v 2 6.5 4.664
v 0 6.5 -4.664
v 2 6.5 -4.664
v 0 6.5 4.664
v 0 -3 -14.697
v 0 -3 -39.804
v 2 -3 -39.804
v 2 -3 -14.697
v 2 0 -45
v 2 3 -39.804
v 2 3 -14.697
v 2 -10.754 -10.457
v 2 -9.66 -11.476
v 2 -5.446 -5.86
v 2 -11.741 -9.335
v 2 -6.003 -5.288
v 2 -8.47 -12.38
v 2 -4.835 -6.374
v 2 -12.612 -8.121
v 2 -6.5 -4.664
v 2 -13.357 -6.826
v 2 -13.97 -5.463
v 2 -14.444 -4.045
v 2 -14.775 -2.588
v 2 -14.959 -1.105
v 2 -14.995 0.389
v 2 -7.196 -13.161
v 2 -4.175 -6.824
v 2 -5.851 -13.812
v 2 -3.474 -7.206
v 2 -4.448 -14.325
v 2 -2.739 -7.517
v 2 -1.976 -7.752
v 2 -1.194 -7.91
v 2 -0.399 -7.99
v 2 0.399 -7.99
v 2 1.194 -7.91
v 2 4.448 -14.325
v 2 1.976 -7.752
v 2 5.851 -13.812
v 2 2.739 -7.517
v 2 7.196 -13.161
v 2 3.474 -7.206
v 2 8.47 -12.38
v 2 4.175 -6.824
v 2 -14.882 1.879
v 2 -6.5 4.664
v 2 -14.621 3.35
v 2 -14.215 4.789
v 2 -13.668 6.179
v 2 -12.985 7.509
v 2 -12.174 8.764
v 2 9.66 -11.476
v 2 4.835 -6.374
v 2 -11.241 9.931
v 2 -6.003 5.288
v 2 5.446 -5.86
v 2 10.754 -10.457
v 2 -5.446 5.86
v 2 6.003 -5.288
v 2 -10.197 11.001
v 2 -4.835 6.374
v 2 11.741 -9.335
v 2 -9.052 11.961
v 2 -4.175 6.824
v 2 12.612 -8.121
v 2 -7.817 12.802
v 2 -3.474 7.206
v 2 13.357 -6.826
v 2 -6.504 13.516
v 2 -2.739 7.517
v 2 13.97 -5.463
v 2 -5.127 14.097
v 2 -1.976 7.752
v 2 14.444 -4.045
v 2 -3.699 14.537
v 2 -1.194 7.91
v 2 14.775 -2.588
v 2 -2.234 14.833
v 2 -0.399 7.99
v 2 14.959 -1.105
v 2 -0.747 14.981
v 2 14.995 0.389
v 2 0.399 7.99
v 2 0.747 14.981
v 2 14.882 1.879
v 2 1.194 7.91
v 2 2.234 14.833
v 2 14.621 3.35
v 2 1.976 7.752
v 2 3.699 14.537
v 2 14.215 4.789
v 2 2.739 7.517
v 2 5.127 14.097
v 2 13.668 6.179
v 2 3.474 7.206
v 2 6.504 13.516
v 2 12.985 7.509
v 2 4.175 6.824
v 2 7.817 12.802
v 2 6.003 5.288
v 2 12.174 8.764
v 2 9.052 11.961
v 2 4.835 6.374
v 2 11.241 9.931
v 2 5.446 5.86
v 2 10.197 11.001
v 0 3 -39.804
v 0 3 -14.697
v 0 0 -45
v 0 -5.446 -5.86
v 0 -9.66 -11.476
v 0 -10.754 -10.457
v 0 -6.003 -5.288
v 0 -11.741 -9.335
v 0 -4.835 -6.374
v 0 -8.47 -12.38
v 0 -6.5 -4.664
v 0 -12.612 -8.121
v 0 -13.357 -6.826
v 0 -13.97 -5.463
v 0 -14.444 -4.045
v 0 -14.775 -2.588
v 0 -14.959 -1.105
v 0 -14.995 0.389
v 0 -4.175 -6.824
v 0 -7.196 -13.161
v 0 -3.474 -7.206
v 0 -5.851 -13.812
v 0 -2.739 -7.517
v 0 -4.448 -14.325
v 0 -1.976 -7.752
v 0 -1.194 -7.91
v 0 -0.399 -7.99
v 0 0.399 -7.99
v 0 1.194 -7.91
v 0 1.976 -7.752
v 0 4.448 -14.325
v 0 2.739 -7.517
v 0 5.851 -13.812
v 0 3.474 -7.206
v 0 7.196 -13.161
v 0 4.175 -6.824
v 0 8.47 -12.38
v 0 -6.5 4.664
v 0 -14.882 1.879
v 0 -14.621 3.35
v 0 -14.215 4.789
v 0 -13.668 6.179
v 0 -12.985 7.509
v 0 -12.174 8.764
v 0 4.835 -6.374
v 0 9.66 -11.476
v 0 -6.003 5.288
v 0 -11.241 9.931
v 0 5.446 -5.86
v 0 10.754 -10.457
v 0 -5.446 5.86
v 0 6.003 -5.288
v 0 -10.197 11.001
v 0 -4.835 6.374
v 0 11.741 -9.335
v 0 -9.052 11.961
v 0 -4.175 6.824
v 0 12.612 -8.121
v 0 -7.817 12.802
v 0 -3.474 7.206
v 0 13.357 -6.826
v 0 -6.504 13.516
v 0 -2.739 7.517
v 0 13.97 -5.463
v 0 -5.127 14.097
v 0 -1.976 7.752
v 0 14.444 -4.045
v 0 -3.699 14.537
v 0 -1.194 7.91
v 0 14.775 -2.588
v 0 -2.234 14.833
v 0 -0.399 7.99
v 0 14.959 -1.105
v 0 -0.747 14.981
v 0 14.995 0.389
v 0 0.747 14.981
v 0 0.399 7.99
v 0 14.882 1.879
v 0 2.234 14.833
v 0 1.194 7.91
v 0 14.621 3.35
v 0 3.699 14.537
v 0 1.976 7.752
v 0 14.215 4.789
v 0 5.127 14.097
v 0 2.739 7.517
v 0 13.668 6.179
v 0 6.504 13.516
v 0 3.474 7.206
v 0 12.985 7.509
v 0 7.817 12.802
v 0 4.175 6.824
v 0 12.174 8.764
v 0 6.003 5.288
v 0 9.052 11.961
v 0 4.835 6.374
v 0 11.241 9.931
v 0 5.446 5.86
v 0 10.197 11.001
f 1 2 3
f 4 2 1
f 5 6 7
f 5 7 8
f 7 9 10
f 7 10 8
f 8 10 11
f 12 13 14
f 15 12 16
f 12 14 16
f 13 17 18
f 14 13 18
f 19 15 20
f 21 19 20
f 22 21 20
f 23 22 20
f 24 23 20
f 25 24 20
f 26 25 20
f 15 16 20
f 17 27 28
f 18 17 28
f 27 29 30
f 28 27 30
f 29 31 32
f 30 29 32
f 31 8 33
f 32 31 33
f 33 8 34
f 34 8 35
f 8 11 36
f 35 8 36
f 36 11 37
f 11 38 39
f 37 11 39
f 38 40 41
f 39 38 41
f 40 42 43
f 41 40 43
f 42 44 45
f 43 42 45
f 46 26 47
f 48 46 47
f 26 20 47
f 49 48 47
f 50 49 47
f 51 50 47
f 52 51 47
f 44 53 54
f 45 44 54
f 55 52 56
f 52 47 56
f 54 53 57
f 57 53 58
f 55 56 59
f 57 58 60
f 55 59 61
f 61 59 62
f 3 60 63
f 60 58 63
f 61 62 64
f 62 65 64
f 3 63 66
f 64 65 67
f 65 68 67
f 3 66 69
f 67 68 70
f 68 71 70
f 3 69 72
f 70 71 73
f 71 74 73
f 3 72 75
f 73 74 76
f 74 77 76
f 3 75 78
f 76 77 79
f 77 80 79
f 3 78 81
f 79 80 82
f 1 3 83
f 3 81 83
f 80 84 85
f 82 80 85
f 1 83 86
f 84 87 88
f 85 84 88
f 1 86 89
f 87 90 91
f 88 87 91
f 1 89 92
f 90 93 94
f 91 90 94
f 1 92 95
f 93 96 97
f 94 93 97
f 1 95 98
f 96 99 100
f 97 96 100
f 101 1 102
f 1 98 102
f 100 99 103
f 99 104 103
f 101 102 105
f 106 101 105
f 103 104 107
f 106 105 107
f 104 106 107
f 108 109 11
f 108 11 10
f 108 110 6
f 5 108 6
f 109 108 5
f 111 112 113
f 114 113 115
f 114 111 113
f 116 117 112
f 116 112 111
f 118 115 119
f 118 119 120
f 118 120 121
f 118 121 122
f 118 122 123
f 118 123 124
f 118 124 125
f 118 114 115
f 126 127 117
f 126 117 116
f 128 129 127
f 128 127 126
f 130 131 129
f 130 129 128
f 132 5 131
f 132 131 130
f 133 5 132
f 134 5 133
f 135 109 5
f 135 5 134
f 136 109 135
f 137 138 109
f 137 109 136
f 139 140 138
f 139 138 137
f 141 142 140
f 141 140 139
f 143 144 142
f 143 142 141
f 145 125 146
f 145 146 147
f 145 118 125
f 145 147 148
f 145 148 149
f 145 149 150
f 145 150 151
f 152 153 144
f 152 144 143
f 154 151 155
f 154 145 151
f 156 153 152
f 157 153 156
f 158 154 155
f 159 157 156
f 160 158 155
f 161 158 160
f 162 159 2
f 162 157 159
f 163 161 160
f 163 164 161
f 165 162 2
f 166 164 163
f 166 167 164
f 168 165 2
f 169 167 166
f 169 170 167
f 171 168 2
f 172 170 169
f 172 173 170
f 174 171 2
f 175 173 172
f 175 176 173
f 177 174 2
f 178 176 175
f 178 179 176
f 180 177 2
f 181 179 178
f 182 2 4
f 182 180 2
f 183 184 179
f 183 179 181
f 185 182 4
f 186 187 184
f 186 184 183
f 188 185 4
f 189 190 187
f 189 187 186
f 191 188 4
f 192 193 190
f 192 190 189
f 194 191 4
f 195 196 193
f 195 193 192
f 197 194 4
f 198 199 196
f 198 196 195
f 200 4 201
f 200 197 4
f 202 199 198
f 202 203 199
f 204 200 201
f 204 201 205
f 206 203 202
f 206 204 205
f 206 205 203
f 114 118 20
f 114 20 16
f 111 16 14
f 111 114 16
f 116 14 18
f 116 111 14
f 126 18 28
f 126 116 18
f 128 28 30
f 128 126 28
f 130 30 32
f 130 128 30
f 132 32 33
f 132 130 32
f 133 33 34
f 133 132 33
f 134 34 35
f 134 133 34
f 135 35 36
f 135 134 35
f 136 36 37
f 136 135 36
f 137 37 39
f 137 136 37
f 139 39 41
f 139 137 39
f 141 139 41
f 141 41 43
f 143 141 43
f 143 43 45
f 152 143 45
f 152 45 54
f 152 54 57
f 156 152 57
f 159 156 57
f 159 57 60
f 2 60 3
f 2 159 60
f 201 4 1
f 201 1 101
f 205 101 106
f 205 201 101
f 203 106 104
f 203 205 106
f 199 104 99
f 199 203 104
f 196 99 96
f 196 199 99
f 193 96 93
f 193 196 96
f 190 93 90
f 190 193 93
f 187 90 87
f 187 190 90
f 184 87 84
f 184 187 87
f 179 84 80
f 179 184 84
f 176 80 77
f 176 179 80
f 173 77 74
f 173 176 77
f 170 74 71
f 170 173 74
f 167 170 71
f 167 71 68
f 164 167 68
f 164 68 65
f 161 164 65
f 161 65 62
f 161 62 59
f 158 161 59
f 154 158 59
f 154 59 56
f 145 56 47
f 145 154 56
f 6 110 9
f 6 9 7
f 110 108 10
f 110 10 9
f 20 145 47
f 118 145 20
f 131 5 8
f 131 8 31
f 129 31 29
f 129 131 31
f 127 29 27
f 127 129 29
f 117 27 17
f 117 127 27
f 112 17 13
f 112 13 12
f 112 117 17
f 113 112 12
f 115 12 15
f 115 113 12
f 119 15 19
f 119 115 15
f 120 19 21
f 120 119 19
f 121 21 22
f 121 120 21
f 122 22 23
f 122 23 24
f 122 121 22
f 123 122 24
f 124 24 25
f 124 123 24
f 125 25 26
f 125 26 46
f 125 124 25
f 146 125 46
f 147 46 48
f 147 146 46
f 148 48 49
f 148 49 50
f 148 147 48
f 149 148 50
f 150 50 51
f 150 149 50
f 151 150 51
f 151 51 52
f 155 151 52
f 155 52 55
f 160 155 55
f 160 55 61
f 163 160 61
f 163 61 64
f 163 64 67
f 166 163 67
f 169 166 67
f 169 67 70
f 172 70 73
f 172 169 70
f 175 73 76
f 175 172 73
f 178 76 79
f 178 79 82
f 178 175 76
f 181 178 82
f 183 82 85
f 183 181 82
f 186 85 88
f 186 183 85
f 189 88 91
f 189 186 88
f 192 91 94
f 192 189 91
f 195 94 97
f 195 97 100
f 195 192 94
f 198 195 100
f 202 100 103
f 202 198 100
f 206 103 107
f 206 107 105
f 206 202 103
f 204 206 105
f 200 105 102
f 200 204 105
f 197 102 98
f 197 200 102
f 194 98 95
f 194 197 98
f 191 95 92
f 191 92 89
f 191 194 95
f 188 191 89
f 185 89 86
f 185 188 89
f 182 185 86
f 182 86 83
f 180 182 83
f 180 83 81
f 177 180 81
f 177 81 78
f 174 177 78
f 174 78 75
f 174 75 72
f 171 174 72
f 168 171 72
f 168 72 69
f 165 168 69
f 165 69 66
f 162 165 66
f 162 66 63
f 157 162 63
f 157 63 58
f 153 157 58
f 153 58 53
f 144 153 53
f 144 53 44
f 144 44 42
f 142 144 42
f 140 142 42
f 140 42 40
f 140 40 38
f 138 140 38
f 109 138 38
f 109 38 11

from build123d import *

# Parameters (mm, degrees)
BOSS_EXTRU_1_DEPTH = 2


with BuildPart() as part:
    # Esquisse1 → Boss.-Extru.1 (new body)
    with BuildSketch(Plane(origin=(0, 0, 0), x_dir=(0, 0, -1), z_dir=(1, 0, 0))):
        with BuildLine():
            Line((14.696938457, 3), (39.803847577, 3))
            Line((39.803847577, 3), (45, 0))
            Line((45, 0), (39.803847577, -3))
            Line((39.803847577, -3), (14.696938457, -3))
            ThreePointArc((14.696938457, -3), (-15, 0), (14.696938457, 3))
        make_face()
        with BuildLine():
            Line((-4.663689527, -6.5), (4.663689527, -6.5))
            ThreePointArc((4.663689527, -6.5), (8, 0), (4.663689527, 6.5))
            Line((4.663689527, 6.5), (-4.663689527, 6.5))
            ThreePointArc((-4.663689527, 6.5), (-8, 0), (-4.663689527, -6.5))
        make_face(mode=Mode.SUBTRACT)
    extrude(amount=BOSS_EXTRU_1_DEPTH)


solid = part.part
